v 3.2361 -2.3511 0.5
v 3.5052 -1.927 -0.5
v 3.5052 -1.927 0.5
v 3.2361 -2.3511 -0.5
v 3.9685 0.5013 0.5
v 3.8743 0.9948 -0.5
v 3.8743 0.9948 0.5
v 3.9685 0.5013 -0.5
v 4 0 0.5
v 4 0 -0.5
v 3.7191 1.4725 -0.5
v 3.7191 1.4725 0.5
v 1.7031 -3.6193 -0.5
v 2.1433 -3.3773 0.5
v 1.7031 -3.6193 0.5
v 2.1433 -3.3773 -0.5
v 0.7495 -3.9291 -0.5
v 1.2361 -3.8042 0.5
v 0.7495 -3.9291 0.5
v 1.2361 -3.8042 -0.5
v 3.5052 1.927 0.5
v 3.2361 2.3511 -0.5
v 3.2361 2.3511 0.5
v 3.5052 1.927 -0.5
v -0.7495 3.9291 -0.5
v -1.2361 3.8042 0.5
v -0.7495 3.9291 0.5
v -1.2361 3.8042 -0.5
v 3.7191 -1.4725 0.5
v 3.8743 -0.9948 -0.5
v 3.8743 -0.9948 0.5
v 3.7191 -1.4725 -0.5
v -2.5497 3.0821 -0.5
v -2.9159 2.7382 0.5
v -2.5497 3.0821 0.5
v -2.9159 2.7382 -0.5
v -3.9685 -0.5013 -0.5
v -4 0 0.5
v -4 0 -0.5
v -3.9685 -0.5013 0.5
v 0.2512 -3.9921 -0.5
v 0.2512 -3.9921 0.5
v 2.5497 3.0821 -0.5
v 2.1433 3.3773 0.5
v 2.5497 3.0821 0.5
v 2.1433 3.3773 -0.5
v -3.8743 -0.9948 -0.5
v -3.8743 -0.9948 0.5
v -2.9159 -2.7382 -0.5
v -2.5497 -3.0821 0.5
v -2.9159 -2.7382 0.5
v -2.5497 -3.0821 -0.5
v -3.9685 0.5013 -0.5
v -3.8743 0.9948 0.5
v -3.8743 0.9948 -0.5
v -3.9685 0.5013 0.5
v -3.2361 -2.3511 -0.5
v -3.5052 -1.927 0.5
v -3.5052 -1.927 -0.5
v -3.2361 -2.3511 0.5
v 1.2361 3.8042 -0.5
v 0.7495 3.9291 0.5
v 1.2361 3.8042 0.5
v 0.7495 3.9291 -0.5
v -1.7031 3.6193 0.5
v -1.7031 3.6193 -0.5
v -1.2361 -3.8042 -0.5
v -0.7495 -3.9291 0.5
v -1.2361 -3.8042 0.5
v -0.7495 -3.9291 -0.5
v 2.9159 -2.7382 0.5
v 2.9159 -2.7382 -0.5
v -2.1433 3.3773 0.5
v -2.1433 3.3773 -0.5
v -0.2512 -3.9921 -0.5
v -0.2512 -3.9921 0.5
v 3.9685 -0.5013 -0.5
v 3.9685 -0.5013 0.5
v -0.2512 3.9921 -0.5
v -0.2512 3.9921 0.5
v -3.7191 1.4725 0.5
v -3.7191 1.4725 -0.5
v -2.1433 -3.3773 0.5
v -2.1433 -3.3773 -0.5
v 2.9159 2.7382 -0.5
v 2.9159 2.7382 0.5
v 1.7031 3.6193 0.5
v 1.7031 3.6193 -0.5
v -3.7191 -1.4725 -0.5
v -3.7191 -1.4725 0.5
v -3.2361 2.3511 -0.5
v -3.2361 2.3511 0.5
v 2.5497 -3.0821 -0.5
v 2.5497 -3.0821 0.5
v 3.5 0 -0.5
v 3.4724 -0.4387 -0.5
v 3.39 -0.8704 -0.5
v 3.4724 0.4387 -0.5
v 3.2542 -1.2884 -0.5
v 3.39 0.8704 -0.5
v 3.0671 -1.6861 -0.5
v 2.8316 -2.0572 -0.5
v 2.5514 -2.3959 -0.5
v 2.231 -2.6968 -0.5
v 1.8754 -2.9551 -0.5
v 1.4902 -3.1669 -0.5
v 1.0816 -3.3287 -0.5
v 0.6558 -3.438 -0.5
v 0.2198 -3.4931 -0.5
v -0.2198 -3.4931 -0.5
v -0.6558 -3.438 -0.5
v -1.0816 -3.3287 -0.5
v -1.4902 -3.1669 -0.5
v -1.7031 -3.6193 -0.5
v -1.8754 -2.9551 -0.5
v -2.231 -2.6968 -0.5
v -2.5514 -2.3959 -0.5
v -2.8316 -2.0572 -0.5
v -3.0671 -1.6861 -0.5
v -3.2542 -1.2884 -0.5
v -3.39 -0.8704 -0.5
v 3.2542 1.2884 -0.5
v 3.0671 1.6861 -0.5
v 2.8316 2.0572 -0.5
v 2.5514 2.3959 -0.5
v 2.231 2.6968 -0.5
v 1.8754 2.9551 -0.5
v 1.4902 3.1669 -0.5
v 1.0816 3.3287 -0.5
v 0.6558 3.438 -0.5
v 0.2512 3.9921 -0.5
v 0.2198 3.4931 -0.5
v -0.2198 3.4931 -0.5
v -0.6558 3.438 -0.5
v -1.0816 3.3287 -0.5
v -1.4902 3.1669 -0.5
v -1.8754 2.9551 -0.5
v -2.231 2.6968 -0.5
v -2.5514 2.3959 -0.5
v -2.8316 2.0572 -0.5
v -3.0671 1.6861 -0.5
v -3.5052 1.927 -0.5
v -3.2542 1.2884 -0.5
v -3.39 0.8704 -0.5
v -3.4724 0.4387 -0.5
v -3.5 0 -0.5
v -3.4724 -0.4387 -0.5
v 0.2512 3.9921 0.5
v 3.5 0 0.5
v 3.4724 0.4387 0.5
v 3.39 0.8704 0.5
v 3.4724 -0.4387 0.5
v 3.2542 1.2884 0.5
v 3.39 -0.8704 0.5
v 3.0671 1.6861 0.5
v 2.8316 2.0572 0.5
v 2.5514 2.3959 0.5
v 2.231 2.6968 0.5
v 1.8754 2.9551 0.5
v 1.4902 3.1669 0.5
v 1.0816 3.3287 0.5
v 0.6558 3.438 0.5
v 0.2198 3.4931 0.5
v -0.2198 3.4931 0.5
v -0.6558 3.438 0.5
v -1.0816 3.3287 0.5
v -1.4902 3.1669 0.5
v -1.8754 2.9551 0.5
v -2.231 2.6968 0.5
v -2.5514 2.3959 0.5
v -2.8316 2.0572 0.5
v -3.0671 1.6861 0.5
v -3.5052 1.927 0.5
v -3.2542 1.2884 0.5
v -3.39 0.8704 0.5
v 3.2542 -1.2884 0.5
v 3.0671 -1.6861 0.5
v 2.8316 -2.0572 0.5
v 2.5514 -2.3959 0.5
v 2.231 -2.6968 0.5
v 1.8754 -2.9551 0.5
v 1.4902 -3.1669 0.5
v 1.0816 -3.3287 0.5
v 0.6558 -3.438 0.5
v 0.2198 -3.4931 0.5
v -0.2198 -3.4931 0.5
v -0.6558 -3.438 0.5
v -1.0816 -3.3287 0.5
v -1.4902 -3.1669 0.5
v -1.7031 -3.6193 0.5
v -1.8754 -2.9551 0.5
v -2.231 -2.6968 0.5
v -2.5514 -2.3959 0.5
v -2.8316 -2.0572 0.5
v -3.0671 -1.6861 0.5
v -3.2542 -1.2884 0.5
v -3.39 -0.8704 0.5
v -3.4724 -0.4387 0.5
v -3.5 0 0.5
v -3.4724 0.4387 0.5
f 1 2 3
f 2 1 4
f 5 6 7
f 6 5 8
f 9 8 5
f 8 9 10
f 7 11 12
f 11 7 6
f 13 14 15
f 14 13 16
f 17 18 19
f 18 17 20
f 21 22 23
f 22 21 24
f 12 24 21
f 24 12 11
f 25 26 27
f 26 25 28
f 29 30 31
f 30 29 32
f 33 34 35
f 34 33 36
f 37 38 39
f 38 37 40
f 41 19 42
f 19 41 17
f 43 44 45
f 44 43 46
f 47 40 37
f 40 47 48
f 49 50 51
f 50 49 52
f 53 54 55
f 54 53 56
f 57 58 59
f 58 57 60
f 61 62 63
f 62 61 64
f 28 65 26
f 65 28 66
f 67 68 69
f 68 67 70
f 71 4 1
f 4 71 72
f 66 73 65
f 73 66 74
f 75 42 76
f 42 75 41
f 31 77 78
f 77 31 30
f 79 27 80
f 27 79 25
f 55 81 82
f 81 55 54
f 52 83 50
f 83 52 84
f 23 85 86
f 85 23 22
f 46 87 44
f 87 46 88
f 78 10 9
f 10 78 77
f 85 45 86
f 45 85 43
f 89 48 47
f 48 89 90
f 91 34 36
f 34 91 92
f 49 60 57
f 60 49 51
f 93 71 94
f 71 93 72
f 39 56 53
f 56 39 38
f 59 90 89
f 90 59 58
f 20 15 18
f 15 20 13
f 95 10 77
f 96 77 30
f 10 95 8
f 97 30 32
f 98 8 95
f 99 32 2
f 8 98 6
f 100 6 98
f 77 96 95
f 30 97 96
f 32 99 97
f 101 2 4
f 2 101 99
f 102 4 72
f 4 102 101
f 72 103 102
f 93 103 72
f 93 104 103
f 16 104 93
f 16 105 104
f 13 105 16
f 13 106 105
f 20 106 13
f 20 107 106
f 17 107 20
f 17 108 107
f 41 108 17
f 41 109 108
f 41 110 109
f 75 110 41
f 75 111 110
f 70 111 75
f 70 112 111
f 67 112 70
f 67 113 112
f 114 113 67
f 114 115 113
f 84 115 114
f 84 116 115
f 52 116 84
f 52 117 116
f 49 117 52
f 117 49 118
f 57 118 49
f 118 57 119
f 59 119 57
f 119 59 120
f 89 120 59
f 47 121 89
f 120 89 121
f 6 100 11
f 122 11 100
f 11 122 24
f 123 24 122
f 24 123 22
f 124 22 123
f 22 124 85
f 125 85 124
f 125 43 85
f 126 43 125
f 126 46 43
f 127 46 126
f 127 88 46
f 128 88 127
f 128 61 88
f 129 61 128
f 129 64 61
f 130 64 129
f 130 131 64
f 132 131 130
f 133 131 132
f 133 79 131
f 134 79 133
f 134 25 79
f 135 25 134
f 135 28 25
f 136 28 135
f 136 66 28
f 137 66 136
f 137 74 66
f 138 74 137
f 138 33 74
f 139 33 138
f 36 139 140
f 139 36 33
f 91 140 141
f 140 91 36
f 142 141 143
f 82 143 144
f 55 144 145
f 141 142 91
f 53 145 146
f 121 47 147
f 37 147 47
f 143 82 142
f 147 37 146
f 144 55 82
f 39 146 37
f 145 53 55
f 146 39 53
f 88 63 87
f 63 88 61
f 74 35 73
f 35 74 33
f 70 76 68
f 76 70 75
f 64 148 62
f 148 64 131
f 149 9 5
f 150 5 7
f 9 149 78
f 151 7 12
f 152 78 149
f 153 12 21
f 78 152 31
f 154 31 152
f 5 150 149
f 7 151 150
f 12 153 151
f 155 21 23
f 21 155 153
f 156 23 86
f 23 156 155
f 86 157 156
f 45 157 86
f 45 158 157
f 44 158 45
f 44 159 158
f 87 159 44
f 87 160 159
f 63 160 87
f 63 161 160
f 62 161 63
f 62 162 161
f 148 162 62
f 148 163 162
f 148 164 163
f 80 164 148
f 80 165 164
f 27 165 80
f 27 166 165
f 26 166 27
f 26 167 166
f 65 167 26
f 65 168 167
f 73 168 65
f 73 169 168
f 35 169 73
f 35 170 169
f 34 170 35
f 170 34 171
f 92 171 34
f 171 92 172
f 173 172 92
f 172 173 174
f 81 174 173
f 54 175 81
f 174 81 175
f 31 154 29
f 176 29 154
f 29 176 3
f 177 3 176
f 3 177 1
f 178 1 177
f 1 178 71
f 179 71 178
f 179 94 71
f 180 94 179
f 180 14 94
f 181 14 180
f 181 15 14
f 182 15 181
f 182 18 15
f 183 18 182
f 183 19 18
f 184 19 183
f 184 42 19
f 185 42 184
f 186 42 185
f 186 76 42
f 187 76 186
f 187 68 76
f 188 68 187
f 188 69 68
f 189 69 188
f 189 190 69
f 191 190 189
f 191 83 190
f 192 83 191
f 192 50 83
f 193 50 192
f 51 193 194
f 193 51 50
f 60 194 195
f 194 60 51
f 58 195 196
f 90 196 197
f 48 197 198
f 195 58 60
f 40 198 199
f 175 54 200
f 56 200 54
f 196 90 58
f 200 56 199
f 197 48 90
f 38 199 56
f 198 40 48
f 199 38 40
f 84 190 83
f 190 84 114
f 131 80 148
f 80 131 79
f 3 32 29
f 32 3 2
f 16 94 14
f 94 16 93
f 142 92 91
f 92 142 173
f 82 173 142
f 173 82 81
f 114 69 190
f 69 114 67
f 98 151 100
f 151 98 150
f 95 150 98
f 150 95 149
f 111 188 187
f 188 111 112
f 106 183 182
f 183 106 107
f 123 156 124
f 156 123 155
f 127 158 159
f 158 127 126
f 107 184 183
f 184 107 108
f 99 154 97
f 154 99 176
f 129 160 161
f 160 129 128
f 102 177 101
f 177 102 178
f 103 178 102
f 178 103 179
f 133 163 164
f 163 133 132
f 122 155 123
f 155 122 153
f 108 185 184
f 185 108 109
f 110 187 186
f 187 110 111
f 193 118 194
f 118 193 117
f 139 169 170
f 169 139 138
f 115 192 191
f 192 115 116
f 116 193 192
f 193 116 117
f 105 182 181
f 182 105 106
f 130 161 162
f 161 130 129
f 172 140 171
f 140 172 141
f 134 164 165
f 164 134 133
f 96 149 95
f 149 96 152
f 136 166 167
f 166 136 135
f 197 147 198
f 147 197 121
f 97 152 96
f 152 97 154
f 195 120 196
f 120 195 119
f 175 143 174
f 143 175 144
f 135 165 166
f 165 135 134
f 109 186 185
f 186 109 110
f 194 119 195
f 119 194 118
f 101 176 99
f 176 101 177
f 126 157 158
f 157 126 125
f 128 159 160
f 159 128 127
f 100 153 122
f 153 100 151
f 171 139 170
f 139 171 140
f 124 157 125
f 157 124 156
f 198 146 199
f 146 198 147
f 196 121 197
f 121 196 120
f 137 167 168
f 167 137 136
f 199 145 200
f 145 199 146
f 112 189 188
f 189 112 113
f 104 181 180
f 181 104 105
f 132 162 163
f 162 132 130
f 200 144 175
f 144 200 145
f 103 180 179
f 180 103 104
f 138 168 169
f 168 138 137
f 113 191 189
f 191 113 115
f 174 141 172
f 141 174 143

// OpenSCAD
$fn = 50;


difference() {
	union() {
		translate(v = [0, 0, -0.5000000000]) {
			cylinder(h = 1, r = 4.0000000000);
		}
	}
	union() {
		translate(v = [0, 0, -100.0000000000]) {
			cylinder(h = 200, r = 3.5000000000);
		}
	}
}
